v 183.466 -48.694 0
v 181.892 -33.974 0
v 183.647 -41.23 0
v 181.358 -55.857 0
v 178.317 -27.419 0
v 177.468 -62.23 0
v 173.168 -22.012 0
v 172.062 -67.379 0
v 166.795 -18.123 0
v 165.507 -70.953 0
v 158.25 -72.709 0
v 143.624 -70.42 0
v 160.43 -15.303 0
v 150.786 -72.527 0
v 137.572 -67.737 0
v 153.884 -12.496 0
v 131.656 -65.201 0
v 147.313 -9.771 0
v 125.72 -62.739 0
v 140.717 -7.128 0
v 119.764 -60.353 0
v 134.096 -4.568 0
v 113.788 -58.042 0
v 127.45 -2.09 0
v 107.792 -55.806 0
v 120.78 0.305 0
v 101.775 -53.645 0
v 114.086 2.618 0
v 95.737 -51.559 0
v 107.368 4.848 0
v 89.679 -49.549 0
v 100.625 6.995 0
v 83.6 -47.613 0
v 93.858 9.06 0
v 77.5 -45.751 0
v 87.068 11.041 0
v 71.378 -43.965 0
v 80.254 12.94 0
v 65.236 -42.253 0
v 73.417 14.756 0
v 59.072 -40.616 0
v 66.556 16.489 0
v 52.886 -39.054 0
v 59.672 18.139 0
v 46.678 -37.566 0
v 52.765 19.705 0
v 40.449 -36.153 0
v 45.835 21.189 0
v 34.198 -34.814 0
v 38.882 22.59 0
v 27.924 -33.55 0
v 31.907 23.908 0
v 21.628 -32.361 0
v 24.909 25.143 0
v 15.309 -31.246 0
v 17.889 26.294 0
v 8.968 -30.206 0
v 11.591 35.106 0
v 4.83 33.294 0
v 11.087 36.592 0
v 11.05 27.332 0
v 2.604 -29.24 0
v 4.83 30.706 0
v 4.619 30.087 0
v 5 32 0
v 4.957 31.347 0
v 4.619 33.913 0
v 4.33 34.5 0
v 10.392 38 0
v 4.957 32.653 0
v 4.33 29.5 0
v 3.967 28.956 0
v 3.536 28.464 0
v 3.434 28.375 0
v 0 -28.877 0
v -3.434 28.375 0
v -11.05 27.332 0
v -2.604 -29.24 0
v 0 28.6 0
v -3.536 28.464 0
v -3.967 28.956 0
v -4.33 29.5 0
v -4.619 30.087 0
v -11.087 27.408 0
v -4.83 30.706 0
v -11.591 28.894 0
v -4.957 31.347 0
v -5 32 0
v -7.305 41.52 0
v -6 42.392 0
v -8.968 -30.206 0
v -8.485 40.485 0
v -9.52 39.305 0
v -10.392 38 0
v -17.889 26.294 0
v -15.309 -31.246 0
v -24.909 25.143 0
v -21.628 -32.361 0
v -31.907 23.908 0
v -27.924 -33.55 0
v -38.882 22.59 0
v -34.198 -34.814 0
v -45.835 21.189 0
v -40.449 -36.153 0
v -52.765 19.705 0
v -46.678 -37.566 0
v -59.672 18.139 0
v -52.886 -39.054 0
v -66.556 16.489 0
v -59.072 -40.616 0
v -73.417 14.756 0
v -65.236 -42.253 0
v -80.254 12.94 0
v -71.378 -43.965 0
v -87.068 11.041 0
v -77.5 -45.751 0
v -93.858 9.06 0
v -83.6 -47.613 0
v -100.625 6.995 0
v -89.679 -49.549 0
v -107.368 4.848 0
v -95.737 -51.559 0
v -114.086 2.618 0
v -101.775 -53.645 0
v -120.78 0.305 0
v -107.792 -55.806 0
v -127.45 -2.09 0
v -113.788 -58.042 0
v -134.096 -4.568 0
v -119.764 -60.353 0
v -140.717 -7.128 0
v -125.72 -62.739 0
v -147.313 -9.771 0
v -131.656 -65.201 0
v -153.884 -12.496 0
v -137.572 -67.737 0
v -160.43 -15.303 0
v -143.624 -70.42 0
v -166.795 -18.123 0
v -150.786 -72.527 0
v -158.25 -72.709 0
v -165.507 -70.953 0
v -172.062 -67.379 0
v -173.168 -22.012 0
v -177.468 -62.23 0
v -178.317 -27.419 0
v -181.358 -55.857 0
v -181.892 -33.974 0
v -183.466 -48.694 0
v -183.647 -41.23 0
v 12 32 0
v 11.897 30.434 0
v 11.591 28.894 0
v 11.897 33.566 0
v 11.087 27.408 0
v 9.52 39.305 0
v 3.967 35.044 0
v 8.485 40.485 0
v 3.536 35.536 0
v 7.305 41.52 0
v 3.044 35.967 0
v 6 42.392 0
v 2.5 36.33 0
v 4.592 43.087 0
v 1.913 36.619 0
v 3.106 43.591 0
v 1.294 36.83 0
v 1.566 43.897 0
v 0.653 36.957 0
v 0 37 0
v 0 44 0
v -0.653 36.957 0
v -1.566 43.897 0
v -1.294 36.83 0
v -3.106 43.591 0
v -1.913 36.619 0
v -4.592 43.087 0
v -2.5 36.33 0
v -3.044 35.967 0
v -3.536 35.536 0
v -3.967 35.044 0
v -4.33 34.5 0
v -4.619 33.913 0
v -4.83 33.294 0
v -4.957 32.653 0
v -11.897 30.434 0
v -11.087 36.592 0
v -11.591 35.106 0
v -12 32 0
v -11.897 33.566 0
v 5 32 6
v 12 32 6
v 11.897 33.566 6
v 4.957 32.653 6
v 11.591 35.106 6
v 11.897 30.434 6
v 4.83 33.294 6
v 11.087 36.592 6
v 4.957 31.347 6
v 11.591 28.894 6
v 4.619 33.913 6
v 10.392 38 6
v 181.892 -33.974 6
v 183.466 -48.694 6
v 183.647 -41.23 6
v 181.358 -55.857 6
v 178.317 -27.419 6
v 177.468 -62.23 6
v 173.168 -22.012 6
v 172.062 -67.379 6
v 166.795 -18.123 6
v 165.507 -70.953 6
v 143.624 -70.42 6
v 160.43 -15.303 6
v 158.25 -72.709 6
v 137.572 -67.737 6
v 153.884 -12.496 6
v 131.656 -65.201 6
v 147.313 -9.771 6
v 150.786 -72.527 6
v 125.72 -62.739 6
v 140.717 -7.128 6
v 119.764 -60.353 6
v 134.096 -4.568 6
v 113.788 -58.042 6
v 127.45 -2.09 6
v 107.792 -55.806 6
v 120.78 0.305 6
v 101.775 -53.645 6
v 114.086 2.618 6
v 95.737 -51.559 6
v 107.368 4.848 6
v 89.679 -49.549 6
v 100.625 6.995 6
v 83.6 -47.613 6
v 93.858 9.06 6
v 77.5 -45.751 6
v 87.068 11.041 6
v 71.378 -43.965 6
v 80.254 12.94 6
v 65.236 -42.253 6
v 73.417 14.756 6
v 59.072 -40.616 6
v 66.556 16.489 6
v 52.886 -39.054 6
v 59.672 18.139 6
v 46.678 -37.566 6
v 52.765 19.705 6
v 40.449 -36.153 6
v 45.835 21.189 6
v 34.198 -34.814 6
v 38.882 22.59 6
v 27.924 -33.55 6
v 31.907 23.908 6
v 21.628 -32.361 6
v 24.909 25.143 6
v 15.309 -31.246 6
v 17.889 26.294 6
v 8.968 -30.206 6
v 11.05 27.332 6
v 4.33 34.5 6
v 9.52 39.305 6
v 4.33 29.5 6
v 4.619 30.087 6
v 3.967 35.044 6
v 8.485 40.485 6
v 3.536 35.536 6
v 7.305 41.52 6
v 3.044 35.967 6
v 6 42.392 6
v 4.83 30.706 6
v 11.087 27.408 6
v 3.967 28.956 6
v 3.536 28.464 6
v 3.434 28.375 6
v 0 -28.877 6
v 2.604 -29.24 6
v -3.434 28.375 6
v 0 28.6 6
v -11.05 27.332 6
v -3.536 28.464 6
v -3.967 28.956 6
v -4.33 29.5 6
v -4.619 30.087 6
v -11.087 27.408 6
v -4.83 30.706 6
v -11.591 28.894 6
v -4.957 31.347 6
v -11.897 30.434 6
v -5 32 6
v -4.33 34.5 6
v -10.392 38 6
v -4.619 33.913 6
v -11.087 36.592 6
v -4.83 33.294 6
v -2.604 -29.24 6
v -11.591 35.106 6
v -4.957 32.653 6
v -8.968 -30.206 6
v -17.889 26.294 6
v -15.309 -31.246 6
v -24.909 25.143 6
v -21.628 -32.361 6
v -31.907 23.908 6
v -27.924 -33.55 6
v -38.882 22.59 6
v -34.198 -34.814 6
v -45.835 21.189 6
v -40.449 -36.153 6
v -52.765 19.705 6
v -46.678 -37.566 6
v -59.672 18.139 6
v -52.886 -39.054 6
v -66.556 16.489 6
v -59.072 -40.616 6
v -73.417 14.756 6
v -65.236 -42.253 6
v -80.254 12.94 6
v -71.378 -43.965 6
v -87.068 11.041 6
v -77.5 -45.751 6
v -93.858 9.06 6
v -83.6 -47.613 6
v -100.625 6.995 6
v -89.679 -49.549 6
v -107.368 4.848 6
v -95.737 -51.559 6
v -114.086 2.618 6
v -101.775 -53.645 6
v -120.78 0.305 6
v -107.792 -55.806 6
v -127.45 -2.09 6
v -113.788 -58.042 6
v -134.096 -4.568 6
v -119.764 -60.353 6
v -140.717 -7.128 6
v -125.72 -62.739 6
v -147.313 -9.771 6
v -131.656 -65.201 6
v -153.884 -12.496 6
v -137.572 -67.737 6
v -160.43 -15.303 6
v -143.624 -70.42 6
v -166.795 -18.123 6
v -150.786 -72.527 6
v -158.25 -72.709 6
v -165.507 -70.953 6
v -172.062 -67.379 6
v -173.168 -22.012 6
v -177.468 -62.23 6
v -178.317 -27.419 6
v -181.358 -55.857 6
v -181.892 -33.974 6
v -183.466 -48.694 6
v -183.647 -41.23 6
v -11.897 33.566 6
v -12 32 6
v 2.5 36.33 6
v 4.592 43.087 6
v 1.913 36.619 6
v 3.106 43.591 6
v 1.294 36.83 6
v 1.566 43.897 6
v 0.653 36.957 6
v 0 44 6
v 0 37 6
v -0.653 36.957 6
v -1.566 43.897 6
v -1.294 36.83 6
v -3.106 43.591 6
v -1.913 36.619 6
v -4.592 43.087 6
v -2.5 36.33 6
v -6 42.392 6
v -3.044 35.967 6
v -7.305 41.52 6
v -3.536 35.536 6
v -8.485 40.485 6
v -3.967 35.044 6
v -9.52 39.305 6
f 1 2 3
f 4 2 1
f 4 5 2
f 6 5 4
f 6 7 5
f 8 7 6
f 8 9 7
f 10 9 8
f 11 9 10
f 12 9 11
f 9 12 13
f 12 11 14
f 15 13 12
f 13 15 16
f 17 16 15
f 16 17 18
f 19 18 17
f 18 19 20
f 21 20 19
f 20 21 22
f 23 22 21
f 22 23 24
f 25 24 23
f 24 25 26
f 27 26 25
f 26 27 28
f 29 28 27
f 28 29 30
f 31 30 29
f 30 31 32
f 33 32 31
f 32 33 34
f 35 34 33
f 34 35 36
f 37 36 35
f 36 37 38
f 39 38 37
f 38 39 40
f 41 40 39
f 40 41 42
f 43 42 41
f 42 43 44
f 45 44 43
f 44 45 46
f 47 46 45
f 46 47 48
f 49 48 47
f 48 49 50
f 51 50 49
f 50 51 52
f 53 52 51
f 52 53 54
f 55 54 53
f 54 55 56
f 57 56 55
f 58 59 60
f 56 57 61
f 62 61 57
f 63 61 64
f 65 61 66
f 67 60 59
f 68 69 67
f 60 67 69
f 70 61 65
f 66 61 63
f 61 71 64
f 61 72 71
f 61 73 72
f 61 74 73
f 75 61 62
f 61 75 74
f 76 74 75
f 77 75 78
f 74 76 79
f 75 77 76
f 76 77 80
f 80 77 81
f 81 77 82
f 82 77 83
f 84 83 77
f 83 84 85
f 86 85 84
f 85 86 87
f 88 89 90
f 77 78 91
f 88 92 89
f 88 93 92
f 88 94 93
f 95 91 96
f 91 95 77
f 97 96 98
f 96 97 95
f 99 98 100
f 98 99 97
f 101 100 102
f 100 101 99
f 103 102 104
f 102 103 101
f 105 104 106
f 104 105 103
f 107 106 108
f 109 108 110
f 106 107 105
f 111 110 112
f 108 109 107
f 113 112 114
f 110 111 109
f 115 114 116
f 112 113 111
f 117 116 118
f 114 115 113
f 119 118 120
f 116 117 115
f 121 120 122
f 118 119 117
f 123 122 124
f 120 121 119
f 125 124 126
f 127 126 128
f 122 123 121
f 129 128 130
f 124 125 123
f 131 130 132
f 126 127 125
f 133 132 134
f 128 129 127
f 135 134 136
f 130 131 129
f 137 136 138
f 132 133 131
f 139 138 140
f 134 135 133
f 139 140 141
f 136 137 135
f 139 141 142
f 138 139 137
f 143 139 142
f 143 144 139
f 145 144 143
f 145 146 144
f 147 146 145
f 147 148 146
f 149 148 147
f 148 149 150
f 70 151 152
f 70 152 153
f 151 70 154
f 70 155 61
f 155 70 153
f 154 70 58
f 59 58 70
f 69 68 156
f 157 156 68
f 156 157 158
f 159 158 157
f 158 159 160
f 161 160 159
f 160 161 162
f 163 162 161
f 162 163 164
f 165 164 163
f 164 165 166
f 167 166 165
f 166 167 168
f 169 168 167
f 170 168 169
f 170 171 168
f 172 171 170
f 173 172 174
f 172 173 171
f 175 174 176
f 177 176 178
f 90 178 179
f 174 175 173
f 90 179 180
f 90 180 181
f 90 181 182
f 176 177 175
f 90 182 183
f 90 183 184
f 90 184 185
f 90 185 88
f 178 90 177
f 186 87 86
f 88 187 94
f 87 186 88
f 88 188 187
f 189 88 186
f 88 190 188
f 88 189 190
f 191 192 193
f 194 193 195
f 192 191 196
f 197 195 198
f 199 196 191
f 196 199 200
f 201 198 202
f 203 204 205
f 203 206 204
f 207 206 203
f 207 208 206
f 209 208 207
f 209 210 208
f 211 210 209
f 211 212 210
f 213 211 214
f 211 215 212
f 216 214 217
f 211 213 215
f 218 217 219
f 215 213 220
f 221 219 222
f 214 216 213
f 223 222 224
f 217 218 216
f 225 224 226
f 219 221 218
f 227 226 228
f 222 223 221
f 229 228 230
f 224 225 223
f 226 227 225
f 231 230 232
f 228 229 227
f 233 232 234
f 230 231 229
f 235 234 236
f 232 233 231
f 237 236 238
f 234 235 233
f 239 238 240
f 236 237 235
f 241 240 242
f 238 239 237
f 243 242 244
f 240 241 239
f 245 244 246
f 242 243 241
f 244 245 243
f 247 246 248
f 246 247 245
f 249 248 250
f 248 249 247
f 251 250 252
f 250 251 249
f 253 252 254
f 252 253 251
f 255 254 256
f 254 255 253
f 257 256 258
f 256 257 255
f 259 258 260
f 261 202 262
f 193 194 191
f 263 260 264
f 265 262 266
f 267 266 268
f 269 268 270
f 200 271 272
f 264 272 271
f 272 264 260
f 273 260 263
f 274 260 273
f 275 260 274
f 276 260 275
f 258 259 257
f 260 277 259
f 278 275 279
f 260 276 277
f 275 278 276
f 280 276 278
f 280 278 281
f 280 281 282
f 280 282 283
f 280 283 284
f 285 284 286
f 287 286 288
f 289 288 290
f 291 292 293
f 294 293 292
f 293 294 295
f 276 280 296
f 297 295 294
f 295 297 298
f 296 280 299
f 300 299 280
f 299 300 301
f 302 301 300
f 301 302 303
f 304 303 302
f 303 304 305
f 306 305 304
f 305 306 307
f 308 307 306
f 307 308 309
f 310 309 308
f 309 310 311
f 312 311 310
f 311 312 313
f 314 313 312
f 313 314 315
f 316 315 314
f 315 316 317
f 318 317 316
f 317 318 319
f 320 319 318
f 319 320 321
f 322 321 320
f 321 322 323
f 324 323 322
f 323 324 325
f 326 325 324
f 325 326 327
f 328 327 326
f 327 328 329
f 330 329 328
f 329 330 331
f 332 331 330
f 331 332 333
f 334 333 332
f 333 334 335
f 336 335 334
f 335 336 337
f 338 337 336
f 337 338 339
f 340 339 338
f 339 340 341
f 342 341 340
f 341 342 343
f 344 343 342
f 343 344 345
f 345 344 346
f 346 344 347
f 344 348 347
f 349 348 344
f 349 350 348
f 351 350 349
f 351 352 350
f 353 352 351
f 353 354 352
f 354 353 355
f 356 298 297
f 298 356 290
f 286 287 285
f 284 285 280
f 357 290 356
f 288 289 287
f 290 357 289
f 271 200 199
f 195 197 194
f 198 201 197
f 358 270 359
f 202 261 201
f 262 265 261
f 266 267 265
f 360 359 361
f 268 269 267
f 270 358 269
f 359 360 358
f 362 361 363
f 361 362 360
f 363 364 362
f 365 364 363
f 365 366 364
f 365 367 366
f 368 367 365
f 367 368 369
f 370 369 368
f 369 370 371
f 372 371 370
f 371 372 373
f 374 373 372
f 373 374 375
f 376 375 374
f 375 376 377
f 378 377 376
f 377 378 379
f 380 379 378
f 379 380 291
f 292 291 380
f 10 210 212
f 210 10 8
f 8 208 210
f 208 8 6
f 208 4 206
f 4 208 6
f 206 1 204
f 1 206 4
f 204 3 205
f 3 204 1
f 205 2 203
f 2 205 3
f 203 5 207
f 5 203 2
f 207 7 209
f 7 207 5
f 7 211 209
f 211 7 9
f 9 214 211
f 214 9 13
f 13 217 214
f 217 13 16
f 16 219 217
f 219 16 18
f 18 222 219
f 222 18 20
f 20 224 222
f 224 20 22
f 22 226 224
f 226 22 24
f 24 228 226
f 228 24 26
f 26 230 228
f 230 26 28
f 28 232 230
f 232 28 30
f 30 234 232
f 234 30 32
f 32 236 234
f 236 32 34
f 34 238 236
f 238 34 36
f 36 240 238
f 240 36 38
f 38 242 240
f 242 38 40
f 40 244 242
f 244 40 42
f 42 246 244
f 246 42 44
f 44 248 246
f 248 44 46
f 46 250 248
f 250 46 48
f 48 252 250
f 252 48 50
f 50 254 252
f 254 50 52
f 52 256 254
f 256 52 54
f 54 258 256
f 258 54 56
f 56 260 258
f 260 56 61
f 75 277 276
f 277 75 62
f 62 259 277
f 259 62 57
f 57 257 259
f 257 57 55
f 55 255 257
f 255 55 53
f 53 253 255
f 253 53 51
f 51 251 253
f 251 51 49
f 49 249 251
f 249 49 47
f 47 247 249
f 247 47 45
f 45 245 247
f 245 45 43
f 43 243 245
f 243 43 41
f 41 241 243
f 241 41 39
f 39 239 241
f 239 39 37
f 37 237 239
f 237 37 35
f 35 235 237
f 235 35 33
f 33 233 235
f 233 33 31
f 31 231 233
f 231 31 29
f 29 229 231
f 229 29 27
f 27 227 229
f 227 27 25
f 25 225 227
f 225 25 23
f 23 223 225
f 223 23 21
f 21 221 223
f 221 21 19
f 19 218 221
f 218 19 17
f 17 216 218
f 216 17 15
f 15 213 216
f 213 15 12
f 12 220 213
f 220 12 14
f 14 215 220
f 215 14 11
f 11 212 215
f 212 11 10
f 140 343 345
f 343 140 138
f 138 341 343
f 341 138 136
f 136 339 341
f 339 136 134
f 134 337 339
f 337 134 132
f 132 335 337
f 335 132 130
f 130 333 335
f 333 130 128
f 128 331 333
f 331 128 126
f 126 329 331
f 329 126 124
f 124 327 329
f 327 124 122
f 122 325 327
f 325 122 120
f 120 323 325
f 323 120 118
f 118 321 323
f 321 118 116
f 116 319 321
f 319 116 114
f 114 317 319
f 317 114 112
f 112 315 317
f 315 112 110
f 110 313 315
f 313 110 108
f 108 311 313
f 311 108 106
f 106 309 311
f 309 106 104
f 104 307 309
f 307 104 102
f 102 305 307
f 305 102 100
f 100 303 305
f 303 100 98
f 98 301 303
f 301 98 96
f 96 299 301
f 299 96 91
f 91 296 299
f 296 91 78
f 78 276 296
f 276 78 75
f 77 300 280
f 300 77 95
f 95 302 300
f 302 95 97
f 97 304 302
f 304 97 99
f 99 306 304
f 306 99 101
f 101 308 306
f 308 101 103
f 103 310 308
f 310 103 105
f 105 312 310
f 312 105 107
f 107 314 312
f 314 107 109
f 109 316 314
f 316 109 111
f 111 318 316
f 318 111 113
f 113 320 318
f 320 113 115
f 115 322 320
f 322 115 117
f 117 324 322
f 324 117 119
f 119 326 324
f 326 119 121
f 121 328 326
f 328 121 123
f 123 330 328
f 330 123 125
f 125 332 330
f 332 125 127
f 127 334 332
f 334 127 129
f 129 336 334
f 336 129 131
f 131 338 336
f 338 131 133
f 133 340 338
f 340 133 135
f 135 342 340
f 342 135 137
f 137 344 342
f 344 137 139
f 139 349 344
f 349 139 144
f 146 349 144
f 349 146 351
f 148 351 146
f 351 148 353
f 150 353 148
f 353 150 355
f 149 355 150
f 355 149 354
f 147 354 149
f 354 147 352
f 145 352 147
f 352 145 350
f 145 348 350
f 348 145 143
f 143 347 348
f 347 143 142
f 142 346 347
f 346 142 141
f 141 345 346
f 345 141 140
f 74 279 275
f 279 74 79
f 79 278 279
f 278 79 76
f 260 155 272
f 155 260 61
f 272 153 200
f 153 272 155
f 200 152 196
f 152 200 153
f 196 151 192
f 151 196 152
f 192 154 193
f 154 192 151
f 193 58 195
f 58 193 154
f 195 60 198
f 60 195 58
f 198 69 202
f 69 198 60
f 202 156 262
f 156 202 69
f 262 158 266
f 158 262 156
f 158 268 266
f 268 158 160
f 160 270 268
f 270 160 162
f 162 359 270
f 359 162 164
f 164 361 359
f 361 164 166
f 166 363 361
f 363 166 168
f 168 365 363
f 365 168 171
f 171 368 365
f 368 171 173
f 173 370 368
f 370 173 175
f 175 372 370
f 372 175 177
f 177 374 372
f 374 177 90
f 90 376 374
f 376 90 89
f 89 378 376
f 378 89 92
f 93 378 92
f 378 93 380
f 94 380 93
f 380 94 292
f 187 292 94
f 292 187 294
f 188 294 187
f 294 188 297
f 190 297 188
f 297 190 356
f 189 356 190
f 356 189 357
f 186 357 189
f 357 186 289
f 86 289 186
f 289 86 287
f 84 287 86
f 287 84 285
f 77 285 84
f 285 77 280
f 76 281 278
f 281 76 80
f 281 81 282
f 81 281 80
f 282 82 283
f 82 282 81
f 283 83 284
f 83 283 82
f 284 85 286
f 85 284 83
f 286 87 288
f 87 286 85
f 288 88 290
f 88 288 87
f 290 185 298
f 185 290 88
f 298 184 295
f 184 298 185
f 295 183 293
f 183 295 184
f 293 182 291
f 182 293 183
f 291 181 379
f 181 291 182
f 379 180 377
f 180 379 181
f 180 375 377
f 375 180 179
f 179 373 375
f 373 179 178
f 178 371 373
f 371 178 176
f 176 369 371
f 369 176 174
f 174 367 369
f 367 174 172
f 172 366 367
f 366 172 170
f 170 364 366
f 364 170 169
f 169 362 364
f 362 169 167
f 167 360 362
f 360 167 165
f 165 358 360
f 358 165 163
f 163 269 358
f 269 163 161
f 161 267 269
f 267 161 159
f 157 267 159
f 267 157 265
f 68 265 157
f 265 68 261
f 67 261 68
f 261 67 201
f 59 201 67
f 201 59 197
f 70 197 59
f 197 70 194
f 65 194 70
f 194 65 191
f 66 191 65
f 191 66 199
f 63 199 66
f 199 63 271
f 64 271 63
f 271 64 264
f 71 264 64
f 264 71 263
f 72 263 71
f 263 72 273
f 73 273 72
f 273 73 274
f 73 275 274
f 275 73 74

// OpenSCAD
// hanger-print: rack w19 w=19 cm slope=15.92 deg bow=0.59 cm r=2.86 cm depth=6.0 mm
// Print flat (layers parallel to the page). Generated by hanger_print.mesh.scad; do not edit by hand.
depth = 6.0;
union() {
  linear_extrude(height = depth) polygon([[3.952, 28.326], [10.847, 27.363], [17.889, 26.294], [24.909, 25.143], [31.907, 23.908], [38.882, 22.590], [45.835, 21.189], [52.765, 19.705], [59.672, 18.139], [66.556, 16.489], [73.417, 14.756], [80.254, 12.940], [87.068, 11.041], [93.858, 9.060], [100.625, 6.995], [107.368, 4.848], [114.086, 2.618], [120.780, 0.305], [127.450, -2.090], [134.096, -4.568], [140.717, -7.128], [147.313, -9.771], [153.884, -12.496], [160.430, -15.303], [166.795, -18.123], [173.168, -22.012], [178.317, -27.419], [181.892, -33.974], [183.647, -41.230], [183.466, -48.694], [181.358, -55.857], [177.468, -62.230], [172.062, -67.379], [165.507, -70.953], [158.250, -72.709], [150.786, -72.527], [143.624, -70.420], [137.572, -67.737], [131.656, -65.201], [125.720, -62.739], [119.764, -60.353], [113.788, -58.042], [107.792, -55.806], [101.775, -53.645], [95.737, -51.559], [89.679, -49.549], [83.600, -47.613], [77.500, -45.751], [71.378, -43.965], [65.236, -42.253], [59.072, -40.616], [52.886, -39.054], [46.678, -37.566], [40.449, -36.153], [34.198, -34.814], [27.924, -33.550], [21.628, -32.361], [15.309, -31.246], [8.968, -30.206], [2.604, -29.240], [-3.952, -28.326]]);
  linear_extrude(height = depth) polygon([[3.952, -28.326], [-2.604, -29.240], [-8.968, -30.206], [-15.309, -31.246], [-21.628, -32.361], [-27.924, -33.550], [-34.198, -34.814], [-40.449, -36.153], [-46.678, -37.566], [-52.886, -39.054], [-59.072, -40.616], [-65.236, -42.253], [-71.378, -43.965], [-77.500, -45.751], [-83.600, -47.613], [-89.679, -49.549], [-95.737, -51.559], [-101.775, -53.645], [-107.792, -55.806], [-113.788, -58.042], [-119.764, -60.353], [-125.720, -62.739], [-131.656, -65.201], [-137.572, -67.737], [-143.624, -70.420], [-150.786, -72.527], [-158.250, -72.709], [-165.507, -70.953], [-172.062, -67.379], [-177.468, -62.230], [-181.358, -55.857], [-183.466, -48.694], [-183.647, -41.230], [-181.892, -33.974], [-178.317, -27.419], [-173.168, -22.012], [-166.795, -18.123], [-160.430, -15.303], [-153.884, -12.496], [-147.313, -9.771], [-140.717, -7.128], [-134.096, -4.568], [-127.450, -2.090], [-120.780, 0.305], [-114.086, 2.618], [-107.368, 4.848], [-100.625, 6.995], [-93.858, 9.060], [-87.068, 11.041], [-80.254, 12.940], [-73.417, 14.756], [-66.556, 16.489], [-59.672, 18.139], [-52.765, 19.705], [-45.835, 21.189], [-38.882, 22.590], [-31.907, 23.908], [-24.909, 25.143], [-17.889, 26.294], [-10.847, 27.363], [-3.952, 28.326]]);
  linear_extrude(height = depth) polygon([[28.600, 0.000], [28.355, 3.733], [27.625, 7.402], [26.423, 10.945], [24.768, 14.300], [22.690, 17.411], [20.223, 20.223], [17.411, 22.690], [14.300, 24.768], [10.945, 26.423], [7.402, 27.625], [3.733, 28.355], [0.000, 28.600], [-3.733, 28.355], [-7.402, 27.625], [-10.945, 26.423], [-14.300, 24.768], [-17.411, 22.690], [-20.223, 20.223], [-22.690, 17.411], [-24.768, 14.300], [-26.423, 10.945], [-27.625, 7.402], [-28.355, 3.733], [-28.600, 0.000], [-28.355, -3.733], [-27.625, -7.402], [-26.423, -10.945], [-24.768, -14.300], [-22.690, -17.411], [-20.223, -20.223], [-17.411, -22.690], [-14.300, -24.768], [-10.945, -26.423], [-7.402, -27.625], [-3.733, -28.355], [-0.000, -28.600], [3.733, -28.355], [7.402, -27.625], [10.945, -26.423], [14.300, -24.768], [17.411, -22.690], [20.223, -20.223], [22.690, -17.411], [24.768, -14.300], [26.423, -10.945], [27.625, -7.402], [28.355, -3.733]]);
  linear_extrude(height = depth) polygon([[-7.000, 0.000], [7.000, 0.000], [7.000, 27.000], [-7.000, 27.000]]);
  linear_extrude(height = depth) difference() { polygon([[12.000, 32.000], [11.897, 33.566], [11.591, 35.106], [11.087, 36.592], [10.392, 38.000], [9.520, 39.305], [8.485, 40.485], [7.305, 41.520], [6.000, 42.392], [4.592, 43.087], [3.106, 43.591], [1.566, 43.897], [0.000, 44.000], [-1.566, 43.897], [-3.106, 43.591], [-4.592, 43.087], [-6.000, 42.392], [-7.305, 41.520], [-8.485, 40.485], [-9.520, 39.305], [-10.392, 38.000], [-11.087, 36.592], [-11.591, 35.106], [-11.897, 33.566], [-12.000, 32.000], [-11.897, 30.434], [-11.591, 28.894], [-11.087, 27.408], [-10.392, 26.000], [-9.520, 24.695], [-8.485, 23.515], [-7.305, 22.480], [-6.000, 21.608], [-4.592, 20.913], [-3.106, 20.409], [-1.566, 20.103], [-0.000, 20.000], [1.566, 20.103], [3.106, 20.409], [4.592, 20.913], [6.000, 21.608], [7.305, 22.480], [8.485, 23.515], [9.520, 24.695], [10.392, 26.000], [11.087, 27.408], [11.591, 28.894], [11.897, 30.434]]); polygon([[5.000, 32.000], [4.957, 32.653], [4.830, 33.294], [4.619, 33.913], [4.330, 34.500], [3.967, 35.044], [3.536, 35.536], [3.044, 35.967], [2.500, 36.330], [1.913, 36.619], [1.294, 36.830], [0.653, 36.957], [0.000, 37.000], [-0.653, 36.957], [-1.294, 36.830], [-1.913, 36.619], [-2.500, 36.330], [-3.044, 35.967], [-3.536, 35.536], [-3.967, 35.044], [-4.330, 34.500], [-4.619, 33.913], [-4.830, 33.294], [-4.957, 32.653], [-5.000, 32.000], [-4.957, 31.347], [-4.830, 30.706], [-4.619, 30.087], [-4.330, 29.500], [-3.967, 28.956], [-3.536, 28.464], [-3.044, 28.033], [-2.500, 27.670], [-1.913, 27.381], [-1.294, 27.170], [-0.653, 27.043], [-0.000, 27.000], [0.653, 27.043], [1.294, 27.170], [1.913, 27.381], [2.500, 27.670], [3.044, 28.033], [3.536, 28.464], [3.967, 28.956], [4.330, 29.500], [4.619, 30.087], [4.830, 30.706], [4.957, 31.347]]); }
}
